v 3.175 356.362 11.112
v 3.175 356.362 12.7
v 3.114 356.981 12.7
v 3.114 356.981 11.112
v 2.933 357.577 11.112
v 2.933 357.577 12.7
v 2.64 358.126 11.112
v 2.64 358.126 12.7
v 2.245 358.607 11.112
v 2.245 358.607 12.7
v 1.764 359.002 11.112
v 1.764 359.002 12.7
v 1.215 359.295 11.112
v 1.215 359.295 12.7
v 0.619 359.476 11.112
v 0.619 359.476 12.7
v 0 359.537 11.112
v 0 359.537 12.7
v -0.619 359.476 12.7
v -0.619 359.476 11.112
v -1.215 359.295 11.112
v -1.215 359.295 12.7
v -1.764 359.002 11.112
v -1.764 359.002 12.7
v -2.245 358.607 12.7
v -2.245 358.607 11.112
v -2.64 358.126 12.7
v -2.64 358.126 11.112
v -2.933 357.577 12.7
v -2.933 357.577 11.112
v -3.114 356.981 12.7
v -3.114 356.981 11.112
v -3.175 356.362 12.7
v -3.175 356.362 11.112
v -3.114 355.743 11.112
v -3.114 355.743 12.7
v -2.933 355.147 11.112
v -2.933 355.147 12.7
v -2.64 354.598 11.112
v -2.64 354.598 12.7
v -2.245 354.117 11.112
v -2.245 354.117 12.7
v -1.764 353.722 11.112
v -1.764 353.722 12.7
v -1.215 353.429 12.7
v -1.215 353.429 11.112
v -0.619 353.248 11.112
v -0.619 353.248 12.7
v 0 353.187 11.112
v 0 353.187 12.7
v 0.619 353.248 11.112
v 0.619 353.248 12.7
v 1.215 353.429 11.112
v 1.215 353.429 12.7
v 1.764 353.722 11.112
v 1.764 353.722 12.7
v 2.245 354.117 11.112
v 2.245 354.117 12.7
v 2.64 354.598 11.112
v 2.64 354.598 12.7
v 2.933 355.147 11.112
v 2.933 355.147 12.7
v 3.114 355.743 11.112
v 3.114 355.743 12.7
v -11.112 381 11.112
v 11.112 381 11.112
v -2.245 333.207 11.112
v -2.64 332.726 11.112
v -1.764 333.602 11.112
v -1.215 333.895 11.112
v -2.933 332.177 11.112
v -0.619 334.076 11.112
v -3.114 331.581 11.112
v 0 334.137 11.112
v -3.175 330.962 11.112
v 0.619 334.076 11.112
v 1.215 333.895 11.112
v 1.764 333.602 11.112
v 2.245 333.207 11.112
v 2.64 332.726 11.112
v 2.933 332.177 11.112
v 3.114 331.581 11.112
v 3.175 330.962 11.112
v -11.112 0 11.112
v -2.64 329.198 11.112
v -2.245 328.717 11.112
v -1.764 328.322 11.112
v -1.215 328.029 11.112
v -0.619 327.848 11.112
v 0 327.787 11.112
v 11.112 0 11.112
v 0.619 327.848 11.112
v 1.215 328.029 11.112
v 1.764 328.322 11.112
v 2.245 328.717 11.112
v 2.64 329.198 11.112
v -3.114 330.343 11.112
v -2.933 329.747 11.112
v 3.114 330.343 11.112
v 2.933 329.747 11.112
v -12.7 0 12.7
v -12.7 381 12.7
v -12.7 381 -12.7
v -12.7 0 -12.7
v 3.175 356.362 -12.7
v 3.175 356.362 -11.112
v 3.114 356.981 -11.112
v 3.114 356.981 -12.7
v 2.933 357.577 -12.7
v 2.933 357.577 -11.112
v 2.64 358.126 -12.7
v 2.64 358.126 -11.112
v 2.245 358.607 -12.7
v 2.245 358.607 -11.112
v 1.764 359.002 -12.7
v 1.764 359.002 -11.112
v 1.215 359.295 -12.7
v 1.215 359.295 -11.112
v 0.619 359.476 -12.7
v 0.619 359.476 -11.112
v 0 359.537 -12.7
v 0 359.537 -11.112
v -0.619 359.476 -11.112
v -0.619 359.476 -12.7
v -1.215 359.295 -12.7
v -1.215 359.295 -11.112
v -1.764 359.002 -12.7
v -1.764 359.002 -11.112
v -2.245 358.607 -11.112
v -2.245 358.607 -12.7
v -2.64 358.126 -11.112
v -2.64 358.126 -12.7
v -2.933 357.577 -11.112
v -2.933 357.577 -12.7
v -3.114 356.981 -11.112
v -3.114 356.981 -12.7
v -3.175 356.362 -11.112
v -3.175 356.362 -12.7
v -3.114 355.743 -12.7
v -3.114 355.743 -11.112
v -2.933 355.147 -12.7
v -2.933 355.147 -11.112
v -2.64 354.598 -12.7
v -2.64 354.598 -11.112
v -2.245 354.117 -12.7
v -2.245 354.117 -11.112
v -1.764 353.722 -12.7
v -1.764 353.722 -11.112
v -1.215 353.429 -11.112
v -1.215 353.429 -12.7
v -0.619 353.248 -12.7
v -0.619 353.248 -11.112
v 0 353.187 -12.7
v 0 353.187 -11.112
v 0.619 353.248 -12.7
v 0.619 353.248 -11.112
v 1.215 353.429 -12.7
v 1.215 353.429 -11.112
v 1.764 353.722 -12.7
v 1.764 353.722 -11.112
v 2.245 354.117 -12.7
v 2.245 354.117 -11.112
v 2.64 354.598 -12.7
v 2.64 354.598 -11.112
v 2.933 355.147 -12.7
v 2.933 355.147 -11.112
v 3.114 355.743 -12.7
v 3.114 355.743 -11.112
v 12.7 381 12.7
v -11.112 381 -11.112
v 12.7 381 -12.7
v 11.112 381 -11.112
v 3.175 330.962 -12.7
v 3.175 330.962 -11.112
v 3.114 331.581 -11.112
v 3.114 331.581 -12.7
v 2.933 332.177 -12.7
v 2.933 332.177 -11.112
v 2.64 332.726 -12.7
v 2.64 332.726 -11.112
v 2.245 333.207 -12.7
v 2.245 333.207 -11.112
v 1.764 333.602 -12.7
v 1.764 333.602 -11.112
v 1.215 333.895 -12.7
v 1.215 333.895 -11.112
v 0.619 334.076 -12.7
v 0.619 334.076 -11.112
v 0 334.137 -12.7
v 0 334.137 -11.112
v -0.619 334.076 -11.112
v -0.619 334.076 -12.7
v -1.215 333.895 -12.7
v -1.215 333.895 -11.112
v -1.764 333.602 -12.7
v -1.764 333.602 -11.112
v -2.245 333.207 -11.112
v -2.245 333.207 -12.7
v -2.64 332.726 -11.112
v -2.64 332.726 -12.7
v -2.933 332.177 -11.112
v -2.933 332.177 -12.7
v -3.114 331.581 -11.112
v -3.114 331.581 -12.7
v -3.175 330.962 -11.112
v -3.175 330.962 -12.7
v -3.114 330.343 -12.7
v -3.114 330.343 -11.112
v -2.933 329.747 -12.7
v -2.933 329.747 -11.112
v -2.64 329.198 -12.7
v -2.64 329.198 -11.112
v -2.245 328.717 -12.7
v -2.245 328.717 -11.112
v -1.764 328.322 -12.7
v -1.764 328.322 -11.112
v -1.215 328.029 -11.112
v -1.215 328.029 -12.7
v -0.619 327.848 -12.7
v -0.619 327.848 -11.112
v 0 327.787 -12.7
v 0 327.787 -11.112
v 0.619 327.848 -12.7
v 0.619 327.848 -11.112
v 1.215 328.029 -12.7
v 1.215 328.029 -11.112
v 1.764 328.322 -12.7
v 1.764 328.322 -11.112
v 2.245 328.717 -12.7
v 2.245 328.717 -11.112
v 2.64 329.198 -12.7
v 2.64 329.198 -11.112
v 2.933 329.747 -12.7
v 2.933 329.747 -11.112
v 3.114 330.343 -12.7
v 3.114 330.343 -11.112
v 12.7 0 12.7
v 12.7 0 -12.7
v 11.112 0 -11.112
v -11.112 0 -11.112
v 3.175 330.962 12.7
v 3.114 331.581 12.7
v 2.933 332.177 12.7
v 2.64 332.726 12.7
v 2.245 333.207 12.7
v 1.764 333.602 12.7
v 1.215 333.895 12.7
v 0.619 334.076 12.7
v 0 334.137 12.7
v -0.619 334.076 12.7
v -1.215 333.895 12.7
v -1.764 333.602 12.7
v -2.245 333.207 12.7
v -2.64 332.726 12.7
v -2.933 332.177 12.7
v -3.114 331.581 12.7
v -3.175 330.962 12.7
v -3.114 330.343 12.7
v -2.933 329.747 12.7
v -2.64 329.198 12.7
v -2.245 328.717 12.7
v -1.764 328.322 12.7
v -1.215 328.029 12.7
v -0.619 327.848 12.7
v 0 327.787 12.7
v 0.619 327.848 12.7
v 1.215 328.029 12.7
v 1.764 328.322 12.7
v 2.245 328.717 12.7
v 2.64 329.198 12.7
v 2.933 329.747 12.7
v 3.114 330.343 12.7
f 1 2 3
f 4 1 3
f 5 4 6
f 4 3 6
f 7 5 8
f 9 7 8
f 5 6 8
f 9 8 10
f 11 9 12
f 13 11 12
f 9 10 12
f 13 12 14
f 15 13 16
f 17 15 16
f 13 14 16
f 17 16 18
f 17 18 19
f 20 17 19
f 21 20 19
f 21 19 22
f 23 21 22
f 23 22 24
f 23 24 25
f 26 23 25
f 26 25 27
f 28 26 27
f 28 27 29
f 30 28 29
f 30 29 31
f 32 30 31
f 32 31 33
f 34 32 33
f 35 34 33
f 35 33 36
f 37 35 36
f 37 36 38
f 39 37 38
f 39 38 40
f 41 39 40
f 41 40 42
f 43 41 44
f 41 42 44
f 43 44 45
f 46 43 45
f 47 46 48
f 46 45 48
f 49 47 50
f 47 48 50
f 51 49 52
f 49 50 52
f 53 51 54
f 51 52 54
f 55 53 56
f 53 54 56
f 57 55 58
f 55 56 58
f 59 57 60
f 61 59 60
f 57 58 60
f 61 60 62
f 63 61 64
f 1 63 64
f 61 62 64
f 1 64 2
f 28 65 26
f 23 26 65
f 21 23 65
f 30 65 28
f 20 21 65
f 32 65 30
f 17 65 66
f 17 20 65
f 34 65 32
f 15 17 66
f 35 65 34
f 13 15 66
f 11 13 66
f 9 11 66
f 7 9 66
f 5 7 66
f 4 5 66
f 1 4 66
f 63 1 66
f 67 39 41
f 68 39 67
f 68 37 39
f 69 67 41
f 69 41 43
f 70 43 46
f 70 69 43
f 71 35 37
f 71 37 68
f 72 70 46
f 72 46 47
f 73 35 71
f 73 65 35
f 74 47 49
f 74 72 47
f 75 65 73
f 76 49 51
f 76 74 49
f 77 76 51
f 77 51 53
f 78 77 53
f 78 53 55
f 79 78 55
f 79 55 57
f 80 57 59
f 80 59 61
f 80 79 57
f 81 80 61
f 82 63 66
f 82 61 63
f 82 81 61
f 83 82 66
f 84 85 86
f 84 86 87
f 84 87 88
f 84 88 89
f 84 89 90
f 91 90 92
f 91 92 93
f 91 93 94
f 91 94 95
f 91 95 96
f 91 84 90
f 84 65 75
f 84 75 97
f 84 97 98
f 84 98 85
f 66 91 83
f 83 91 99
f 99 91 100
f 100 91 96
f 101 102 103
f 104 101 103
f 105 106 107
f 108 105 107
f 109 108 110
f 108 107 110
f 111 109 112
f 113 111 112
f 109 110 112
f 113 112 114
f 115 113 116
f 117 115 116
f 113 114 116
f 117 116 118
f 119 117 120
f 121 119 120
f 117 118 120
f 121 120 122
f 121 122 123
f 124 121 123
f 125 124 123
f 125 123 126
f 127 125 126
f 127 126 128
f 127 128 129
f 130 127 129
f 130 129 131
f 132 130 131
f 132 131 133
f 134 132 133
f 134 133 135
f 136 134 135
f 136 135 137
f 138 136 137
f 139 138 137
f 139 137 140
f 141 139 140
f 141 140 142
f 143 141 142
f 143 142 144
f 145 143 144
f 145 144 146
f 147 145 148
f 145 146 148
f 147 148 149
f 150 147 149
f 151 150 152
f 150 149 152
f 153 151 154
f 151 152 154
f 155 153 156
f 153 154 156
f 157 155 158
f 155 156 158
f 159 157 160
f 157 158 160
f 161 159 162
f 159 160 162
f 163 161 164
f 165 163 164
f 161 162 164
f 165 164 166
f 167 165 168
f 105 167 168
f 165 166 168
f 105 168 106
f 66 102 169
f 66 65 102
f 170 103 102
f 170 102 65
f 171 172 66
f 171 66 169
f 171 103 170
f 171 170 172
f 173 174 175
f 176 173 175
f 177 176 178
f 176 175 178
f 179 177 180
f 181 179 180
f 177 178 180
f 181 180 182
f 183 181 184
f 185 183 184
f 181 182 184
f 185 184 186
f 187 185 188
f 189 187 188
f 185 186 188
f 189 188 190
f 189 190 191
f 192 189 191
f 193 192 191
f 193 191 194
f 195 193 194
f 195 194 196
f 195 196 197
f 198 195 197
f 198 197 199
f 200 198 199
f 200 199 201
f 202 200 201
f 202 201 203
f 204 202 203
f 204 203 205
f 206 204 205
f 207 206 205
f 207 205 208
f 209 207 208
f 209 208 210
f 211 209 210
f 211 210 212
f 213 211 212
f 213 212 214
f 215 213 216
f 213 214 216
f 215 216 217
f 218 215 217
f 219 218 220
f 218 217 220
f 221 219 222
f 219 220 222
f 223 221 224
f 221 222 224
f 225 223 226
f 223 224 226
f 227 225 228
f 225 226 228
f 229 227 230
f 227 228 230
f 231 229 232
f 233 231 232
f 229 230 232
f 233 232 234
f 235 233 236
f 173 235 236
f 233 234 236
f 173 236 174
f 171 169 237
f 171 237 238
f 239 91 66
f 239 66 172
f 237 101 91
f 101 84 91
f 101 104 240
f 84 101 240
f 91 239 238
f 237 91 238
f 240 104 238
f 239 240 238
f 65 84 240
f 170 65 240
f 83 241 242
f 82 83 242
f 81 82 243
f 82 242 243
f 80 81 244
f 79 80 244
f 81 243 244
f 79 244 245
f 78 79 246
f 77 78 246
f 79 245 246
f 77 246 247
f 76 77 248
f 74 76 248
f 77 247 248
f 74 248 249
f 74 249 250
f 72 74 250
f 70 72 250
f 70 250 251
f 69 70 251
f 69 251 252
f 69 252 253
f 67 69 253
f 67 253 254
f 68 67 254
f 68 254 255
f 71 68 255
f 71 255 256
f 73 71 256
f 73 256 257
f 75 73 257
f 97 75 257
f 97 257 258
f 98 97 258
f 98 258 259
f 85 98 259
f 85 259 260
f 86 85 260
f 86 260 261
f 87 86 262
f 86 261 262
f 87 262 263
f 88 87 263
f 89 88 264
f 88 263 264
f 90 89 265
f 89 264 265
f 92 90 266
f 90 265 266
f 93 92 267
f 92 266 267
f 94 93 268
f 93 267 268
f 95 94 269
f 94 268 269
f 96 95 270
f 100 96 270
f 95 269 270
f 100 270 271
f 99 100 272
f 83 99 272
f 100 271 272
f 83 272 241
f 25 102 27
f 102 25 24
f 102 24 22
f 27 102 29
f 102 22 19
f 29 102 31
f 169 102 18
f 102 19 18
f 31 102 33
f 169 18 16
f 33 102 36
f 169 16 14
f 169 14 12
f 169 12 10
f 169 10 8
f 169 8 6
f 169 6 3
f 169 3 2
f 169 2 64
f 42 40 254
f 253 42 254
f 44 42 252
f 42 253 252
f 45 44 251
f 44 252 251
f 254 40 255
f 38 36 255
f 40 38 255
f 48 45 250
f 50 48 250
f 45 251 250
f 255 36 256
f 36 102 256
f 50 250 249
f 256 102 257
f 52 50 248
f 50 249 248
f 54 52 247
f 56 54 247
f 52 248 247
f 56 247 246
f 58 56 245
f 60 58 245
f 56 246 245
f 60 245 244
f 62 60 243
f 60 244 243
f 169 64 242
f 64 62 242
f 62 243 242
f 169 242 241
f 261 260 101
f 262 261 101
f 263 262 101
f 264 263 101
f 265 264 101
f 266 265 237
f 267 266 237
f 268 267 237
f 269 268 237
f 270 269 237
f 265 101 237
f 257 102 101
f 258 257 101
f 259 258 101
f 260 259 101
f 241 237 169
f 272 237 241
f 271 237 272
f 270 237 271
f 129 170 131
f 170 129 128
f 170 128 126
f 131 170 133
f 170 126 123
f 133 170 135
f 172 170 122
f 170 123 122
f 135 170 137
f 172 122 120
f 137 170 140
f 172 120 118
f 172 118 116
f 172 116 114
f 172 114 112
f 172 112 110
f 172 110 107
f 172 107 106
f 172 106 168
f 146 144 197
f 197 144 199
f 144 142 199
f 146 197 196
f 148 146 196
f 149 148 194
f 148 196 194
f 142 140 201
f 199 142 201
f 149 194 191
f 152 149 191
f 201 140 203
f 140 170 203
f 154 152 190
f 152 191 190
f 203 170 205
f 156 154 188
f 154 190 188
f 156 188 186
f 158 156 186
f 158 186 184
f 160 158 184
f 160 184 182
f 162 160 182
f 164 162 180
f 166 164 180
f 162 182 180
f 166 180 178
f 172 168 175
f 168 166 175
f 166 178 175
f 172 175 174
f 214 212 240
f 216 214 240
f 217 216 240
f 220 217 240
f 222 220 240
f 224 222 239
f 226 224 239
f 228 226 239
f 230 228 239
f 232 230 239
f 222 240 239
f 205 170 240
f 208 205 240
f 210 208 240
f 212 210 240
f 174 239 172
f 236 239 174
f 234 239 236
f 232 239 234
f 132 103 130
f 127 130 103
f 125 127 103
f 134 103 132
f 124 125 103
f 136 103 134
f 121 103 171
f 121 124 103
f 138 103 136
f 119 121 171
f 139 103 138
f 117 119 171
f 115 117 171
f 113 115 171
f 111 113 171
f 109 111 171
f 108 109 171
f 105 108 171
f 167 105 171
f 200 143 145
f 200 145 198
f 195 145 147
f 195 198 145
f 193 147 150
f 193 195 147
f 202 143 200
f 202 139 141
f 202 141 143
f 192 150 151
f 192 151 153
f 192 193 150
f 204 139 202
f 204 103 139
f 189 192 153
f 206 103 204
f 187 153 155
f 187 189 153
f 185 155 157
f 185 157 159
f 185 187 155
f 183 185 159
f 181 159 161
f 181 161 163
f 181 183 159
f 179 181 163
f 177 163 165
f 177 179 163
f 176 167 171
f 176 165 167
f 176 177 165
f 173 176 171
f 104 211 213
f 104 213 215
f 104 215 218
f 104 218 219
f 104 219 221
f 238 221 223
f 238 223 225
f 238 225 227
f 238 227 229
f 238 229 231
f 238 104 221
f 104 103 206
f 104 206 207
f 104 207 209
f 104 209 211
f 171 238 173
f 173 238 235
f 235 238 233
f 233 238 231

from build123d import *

# Parameters (mm, degrees)
SKETCH1_W           = 25.4
SKETCH1_H           = 25.4
SKETCH1_W_2         = 22.225
SKETCH1_H_2         = 22.225
BOSS_EXTRUDE1_DEPTH = 381
SKETCH2_R           = 3.175
CUT_EXTRUDE1_DEPTH  = 26.4


with BuildPart() as part:
    # Sketch1 → Boss-Extrude1 (new body)
    with BuildSketch(Plane(origin=(0, 0, 0), x_dir=(1, 0, 0), z_dir=(0, 1, 0))):
        Rectangle(SKETCH1_W, SKETCH1_H)
        Rectangle(SKETCH1_W_2, SKETCH1_H_2, mode=Mode.SUBTRACT)
    extrude(amount=BOSS_EXTRUDE1_DEPTH)

    # Sketch2 → Cut-Extrude1 (cut, through all)
    with BuildSketch(Plane.XY.offset(12.7)):
        with Locations((0, 356.362)):
            Circle(SKETCH2_R)
        with Locations((0, 330.962)):
            Circle(SKETCH2_R)
    extrude(amount=-CUT_EXTRUDE1_DEPTH, mode=Mode.SUBTRACT)


solid = part.part
